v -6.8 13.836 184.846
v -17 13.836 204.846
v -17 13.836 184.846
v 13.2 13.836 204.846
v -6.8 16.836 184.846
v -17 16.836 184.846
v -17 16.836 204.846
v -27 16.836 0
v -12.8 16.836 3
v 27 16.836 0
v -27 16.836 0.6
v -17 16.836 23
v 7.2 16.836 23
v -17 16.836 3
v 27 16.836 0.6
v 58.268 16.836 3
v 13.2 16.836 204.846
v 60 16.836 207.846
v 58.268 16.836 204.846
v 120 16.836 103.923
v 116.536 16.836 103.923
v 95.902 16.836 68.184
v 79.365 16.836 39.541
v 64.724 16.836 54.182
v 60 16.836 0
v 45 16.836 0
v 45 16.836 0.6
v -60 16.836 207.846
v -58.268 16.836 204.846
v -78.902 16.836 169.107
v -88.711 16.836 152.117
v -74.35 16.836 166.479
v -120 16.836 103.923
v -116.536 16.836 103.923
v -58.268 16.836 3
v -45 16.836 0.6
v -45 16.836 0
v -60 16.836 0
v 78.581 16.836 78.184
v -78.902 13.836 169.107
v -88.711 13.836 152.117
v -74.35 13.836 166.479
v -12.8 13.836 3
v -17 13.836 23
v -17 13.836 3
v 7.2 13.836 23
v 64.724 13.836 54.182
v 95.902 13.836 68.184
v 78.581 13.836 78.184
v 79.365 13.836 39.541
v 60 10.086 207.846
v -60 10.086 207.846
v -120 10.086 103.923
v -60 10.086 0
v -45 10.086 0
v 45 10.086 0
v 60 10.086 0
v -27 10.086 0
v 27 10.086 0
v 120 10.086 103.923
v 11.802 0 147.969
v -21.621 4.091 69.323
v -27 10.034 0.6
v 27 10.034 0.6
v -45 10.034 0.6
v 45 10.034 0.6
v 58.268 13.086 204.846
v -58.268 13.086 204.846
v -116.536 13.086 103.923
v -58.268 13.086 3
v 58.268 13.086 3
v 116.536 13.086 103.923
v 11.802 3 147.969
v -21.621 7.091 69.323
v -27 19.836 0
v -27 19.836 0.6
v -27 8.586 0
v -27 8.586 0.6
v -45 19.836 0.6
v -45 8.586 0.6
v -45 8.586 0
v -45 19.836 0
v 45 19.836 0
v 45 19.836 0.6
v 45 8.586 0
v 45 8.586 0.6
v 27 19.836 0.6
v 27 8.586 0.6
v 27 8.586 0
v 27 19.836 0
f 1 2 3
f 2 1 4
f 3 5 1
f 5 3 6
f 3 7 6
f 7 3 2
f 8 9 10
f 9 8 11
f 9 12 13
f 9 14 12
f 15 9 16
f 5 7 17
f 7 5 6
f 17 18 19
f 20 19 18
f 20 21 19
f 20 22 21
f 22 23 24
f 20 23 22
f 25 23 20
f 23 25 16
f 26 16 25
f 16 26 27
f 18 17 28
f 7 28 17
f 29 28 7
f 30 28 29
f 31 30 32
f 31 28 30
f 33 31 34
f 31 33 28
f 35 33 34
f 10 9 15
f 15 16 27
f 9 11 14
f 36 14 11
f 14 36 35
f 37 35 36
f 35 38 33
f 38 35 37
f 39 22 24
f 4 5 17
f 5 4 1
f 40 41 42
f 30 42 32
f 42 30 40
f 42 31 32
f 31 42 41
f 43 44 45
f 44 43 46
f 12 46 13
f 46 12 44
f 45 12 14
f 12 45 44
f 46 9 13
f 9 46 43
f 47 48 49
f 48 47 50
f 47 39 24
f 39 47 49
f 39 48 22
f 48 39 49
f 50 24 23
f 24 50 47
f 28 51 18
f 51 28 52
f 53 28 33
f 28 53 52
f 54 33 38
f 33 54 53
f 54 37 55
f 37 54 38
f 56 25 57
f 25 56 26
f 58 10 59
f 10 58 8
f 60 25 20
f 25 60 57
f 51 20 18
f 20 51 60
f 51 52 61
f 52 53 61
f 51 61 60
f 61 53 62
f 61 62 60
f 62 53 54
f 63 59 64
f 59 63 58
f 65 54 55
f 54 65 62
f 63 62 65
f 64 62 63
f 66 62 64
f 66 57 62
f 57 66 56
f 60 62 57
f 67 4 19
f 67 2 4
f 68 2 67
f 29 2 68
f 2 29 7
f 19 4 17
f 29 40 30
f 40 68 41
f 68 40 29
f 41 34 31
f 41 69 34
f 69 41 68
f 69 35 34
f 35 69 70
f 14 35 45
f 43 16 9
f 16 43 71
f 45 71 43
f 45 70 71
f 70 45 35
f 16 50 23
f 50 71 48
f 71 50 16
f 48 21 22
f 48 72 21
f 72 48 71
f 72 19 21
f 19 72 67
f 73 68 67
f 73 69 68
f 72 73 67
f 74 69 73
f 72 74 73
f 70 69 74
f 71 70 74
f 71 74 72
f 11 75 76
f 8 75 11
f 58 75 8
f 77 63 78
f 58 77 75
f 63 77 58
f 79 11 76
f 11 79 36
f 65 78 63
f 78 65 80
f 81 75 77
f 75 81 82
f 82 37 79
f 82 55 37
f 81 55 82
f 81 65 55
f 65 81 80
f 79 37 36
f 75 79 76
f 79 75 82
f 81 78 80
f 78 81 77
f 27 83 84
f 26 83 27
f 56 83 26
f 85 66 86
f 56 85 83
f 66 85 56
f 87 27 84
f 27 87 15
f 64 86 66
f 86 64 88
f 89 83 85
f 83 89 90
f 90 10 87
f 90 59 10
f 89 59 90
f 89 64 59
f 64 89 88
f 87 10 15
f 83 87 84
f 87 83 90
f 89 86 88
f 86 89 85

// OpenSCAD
/*
    parametric_faceted_hex_wall_tile_mount_v30_supportless_chamfered_mounts.scad
    ----------------------------------------------------------------
    Regular asymmetric low-poly hex wall tile.

    v30 goals
    ---------
    1. Multi-object plate packing is the default design target.
    2. Preserve a TRUE regular hexagon -- no X/Y stretching.
    3. Default maximum corner-to-corner width = 240 mm / 9.449 in.
    4. Vertical export rests on a complete flat hex side, not a point.
    5. Open back remains fully open.
    6. Hidden mounting pads remain clipped below the visible face.
    7. One master thickness controls shell, perimeter, and pads.
    8. Integrated low-profile sacrificial stabilizer feet are enabled by default.
    9. Mounting pads use a 45-degree print-aware lower chamfer.
    10. Each elevated pad grows progressively from its perimeter-wall connection
        instead of creating a horizontal underside that triggers support warnings.
    11. No tall fins, diagonal scaffolds, or slicer-generated support are intended.
    12. The rear mounting surface remains flat; only the pad footprint is trimmed
        where required for supportless vertical printing.

    Recommended default
    -------------------
    face_size_reference      = "across_corners";
    face_size_units          = "mm";
    face_size                = 240.0;   // 9.449" maximum width

    tile_rotation_deg        = 15;

    export_orientation       = "vertical";
    vertical_edge_angle_deg  = 15;      // flat side on build plate

    master_thickness_mm      = 3.0;
    add_mount_pads           = true;
    add_mount_ribs           = false;

    // Multi-copy stability:
    add_vertical_breakaway_feet = true;
    vertical_foot_depth_mm       = 5.0;
    vertical_foot_height_mm      = 0.60;
    vertical_foot_neck_mm        = 0.80;

    Export
    ------
    F6 Render
    File -> Export -> Export as STL
*/


// =============================================================================
// CUSTOMIZER PARAMETERS
// =============================================================================


/* [Finished Face Size] */

// "bounding_square"
//     face_size is the maximum X and Y envelope.
//
// "flat_to_flat"
//     face_size is the traditional hex flat-to-flat dimension.
//
// "across_corners"
//     face_size is the regular-hex corner-to-corner dimension.
//
// v30 DEFAULT:
// across_corners = 240 mm so the vertically printed tile is about:
//     X = 240.0 mm
//     Z = 207.85 mm
// while resting on a complete flat edge.
face_size_reference = "across_corners"; // [bounding_square, flat_to_flat, across_corners]

// Units used by face_size.
face_size_units = "mm";                   // [mm, in]

// Default = 240 mm / 9.449 in maximum corner-to-corner width.
// This leaves useful X-axis margin on a 256 mm plate.
face_size = 240.0;

// Rotation of the finished hex within its face plane.
//
// IMPORTANT:
// 15 degrees gives a regular hex an equal X/Y bounding envelope.
// With bounding_square + 254 mm this produces approximately:
//     X = 254.0 mm
//     Y = 254.0 mm
tile_rotation_deg = 15;


/* [Export / Print Orientation] */

// "flat"     = conventional CAD orientation; decorative face points +Z.
// "vertical" = rotate final part onto an edge for vertical printing.
export_orientation = "vertical";          // [flat, vertical]

// Additional in-plane rotation used ONLY before standing the part vertically.
//
// IMPORTANT:
// The finished face uses tile_rotation_deg = 15 so its X/Y envelope is exactly
// square. A regular hex rests on a FLAT SIDE when its effective print-plane
// rotation is 30 degrees (modulo 60 degrees).
//
// Therefore the default vertical export adds another 15 degrees:
//
//     15 deg finished-face rotation
//   + 15 deg vertical export rotation
//   = 30 deg effective print rotation
//
// This puts a complete flat hex side on the build plate instead of a point.
// The transformed model is automatically translated so that side rests at Z=0.
// Rotate the finished 15-degree face orientation another 15 degrees before
// standing it up. 15 + 15 = 30 degrees, which places a complete hex side
// horizontally at the bottom rather than balancing the tile on a vertex.
vertical_edge_angle_deg = 15;

// Add small breakaway stabilizer feet after the model is stood vertically.
// Normally leave OFF and use a slicer brim if required.
add_vertical_breakaway_feet = true;

// Breakaway-foot dimensions.
vertical_foot_length_mm = 18.0;
vertical_foot_depth_mm = 5.0;
vertical_foot_height_mm = 0.60;
vertical_foot_neck_mm = 0.80;


/* [MASTER THICKNESS] */

// Main material thickness control.
master_thickness_mm = 3.0;

// Optional tuning multipliers.
front_shell_multiplier = 1.0;
perimeter_multiplier   = 1.0;
mount_pad_multiplier   = 1.0;


/* [Front Relief] */

// "proportional" scales relief with the true flat-to-flat dimension.
// "absolute" uses explicit millimeter values.
relief_height_mode = "proportional";      // [proportional, absolute]

relief_scale = 1.0;

// Relative relief proportions.
peak_height_ratio = 0.081;
ridge_to_peak_ratio = 0.757;
edge_to_peak_ratio = 0.097;

// Used only in absolute mode.
peak_height_mm   = 18.5;
ridge_height_mm = 14.0;
edge_height_mm  = 1.8;

// Minimum air gap between inner roof and mounting geometry.
edge_clearance_mm = 0.60;


/* [Facet Layout] */

peak_angle_deg = 45;
peak_radius_ratio = 0.38;

ridge_angle_deg = 208;
ridge_radius_ratio = 0.34;


/* [Wall Mounting] */

add_mount_pads = true;

// Width parallel to local hex edge.
mount_pad_width_mm = 34.0;

// Radial depth into the cavity.
mount_pad_depth_mm = 24.0;

// Structural overlap beneath the inner perimeter shell.
mount_pad_overlap_mm = 4.0;

// Pull mounting geometry inward from the visible outside perimeter.
 // Keep this smaller than the perimeter-wall thickness so the pad still
 // overlaps the wall by a positive amount.
// IMPORTANT:
 // Must be LESS than perimeter_wall_thickness_mm so the pads physically
 // overlap the perimeter wall and become one connected solid.
 mount_pad_edge_inset_mm = 0.5;

// Clearance below underside of visible face.
mount_face_clearance_mm = 0.75;

// Mount-pad directions in the tile's local coordinate system.
mount_pad_angles = [60, 120, 240, 300];


/* [Mount Reinforcement] */

add_mount_ribs = false;

mount_rib_width_mm  = 3.0;
mount_rib_height_mm = 5.0;
mount_rib_depth_mm  = 8.0;


/* [Optional Screw Holes] */

add_pad_screw_holes = false;

pad_screw_hole_diameter_mm = 4.5;



/* [Plate Packing Guidance] */

// These values do NOT duplicate objects inside the STL.
// They provide planning numbers in the OpenSCAD console for arranging
// multiple copies in the slicer.
//
// Typical X2D-style plate planning:
//   usable Y = 256 mm
//   keep a conservative front/rear margin
plate_depth_mm = 256.0;

plate_front_margin_mm = 8.0;
plate_rear_margin_mm  = 8.0;

// Recommended empty gap between adjacent standing tiles.
// Increase if using aggressive acceleration or if the printer has noticeable
// resonance/wobble on tall parts.
recommended_inter_tile_gap_mm = 8.0;

// Feet extend from Y=0 to vertical_foot_depth_mm.
// The actual tile relief occupies approximately peak_height in Y.
// Packing pitch uses whichever is deeper, plus the inter-tile gap.


/* [Vertical Self-Supporting Mount Pads] */

// Recommended ON for vertical printing.
//
// Each rectangular mounting-pad footprint is clipped by a 45-degree
// print-space half-space. The lower boundary starts at the pad's wall-connected
// outer corner and rises toward the unsupported portion of the pad.
//
// This avoids BOTH:
//   1. floating-island starts
//   2. flat horizontal pad undersides that cause slicer support warnings.
make_mount_pads_vertical_self_supporting = true;

// Small amount below the wall-connected start height that is retained.
// 0.20 mm is approximately one standard layer and guarantees overlap.
mount_pad_print_safety_mm = 0.20;

// Lower-face chamfer angle in FINAL PRINT coordinates.
//
// 45 degrees is the conservative default for supportless PLA printing.
// Larger values make a steeper/more vertical underside.
// Keep between 40 and 55 degrees unless deliberately experimenting.
mount_pad_support_angle_deg = 45.0;

// Large half-space size used only for clipping.
print_halfspace_size_mm = 1000.0;


/* [Vertical Anti-Float Gussets] */

// Some mounting pads begin above the build plate when the tile is printed
// vertically. Instead of a tall free-standing fin, v28 generates a short,
// diagonal sacrificial gusset from the already-printed perimeter wall toward
// the lowest corner of each affected pad.
//
// The gusset:
// - stays inside the rear cavity
// - is thin in Y for easy removal
// - grows from the shell toward the pad
// - is generated only for pads that would otherwise start as an island
add_vertical_antifloat_gussets = false;

// Thin sacrificial thickness into the cavity.
antifloat_gusset_thickness_mm = 0.70;

// How far the gusset extends into the pad for reliable layer connection.
antifloat_gusset_pad_overlap_mm = 1.50;

// Vertical distance below the first pad layer used for the shell-side anchor.
// A 30 mm drop keeps the diagonal print angle conservative while remaining
// dramatically shorter than the previous full-height support fins.
antifloat_gusset_drop_mm = 30.0;

// Height of the short attachment edge against the perimeter wall.
antifloat_gusset_wall_base_mm = 5.0;

// Keep the wall anchor slightly inside the visible outer perimeter.
antifloat_gusset_wall_inset_mm = 1.5;

// Ignore a pad if its lowest point is already essentially on the build plate.
antifloat_min_height_mm = 0.80;


/* [Advanced] */

polyhedron_convexity = 12;
screw_hole_fn = 40;

// Small numerical tolerance.
eps = 0.01;


// =============================================================================
// HELPERS
// =============================================================================

function polar(angle_deg, radius) =
    [
        radius * cos(angle_deg),
        radius * sin(angle_deg)
    ];

function hex_vertex_unrotated(i, radius) =
    [
        radius * cos(30 + i * 60),
        radius * sin(30 + i * 60)
    ];

function rotate2d(p, angle_deg) =
    [
        p[0] * cos(angle_deg) - p[1] * sin(angle_deg),
        p[0] * sin(angle_deg) + p[1] * cos(angle_deg)
    ];


// Position of a raw mount-pad corner after all in-plane rotations used by the
// vertical export. Returned as [final_X, final_Z] because after rotate X=90,
// original in-plane Y becomes print Z.
function mount_print_corner(angle_deg, radial_r, lateral_t) =
    let(
        theta =
            angle_deg
            + tile_rotation_deg
            + vertical_edge_angle_deg
    )
    [
        radial_r * cos(theta) - lateral_t * sin(theta),
        vertical_half_y
            + radial_r * sin(theta)
            + lateral_t * cos(theta)
    ];

function mount_print_corners(angle_deg) =
    [
        mount_print_corner(
            angle_deg,
            mount_pad_inner_r,
            -mount_pad_width_mm / 2
        ),
        mount_print_corner(
            angle_deg,
            mount_pad_inner_r,
             mount_pad_width_mm / 2
        ),
        mount_print_corner(
            angle_deg,
            mount_pad_desired_outer_r,
            -mount_pad_width_mm / 2
        ),
        mount_print_corner(
            angle_deg,
            mount_pad_desired_outer_r,
             mount_pad_width_mm / 2
        )
    ];

function mount_corner_z_values(angle_deg) =
    [
        for (p = mount_print_corners(angle_deg))
            p[1]
    ];

function mount_lowest_z(angle_deg) =
    min(mount_corner_z_values(angle_deg));

function mount_lowest_corner_index(angle_deg) =
    search(
        mount_lowest_z(angle_deg),
        mount_corner_z_values(angle_deg)
    )[0];

function mount_lowest_x(angle_deg) =
    mount_print_corners(angle_deg)[
        mount_lowest_corner_index(angle_deg)
    ][0];


function mount_outer_print_z_values(angle_deg) =
    [
        mount_print_corner(
            angle_deg,
            mount_pad_desired_outer_r,
            -mount_pad_width_mm / 2
        )[1],

        mount_print_corner(
            angle_deg,
            mount_pad_desired_outer_r,
             mount_pad_width_mm / 2
        )[1]
    ];

function mount_outer_lowest_z(angle_deg) =
    min(mount_outer_print_z_values(angle_deg));

function mount_outer_print_corners(angle_deg) =
    [
        mount_print_corner(
            angle_deg,
            mount_pad_desired_outer_r,
            -mount_pad_width_mm / 2
        ),

        mount_print_corner(
            angle_deg,
            mount_pad_desired_outer_r,
             mount_pad_width_mm / 2
        )
    ];

function mount_outer_lowest_corner_index(angle_deg) =
    search(
        mount_outer_lowest_z(angle_deg),
        mount_outer_print_z_values(angle_deg)
    )[0];

function mount_outer_lowest_x(angle_deg) =
    mount_outer_print_corners(angle_deg)[
        mount_outer_lowest_corner_index(angle_deg)
    ][0];

function mount_outer_lowest_lateral(angle_deg) =
    mount_outer_lowest_corner_index(angle_deg) == 0
        ? -mount_pad_width_mm / 2
        :  mount_pad_width_mm / 2;

function mount_matching_inner_x(angle_deg) =
    mount_print_corner(
        angle_deg,
        mount_pad_inner_r,
        mount_outer_lowest_lateral(angle_deg)
    )[0];

function mount_inward_x_sign(angle_deg) =
    mount_matching_inner_x(angle_deg) >= mount_outer_lowest_x(angle_deg)
        ? 1
        : -1;



// Half-width of the stood-up regular hex at a given print Z.
//
// In the default flat-side-down vertical orientation:
// - bottom/top edges are flat
// - maximum width is across corners
// - total print height is flat-to-flat
//
// This lets the sacrificial gusset anchor itself directly into the perimeter
// wall at the same side of the tile as the affected mounting pad.
function vertical_hex_half_width_at_z(z_mm) =
    let(
        zc = min(max(z_mm, 0), vertical_print_height),
        dz = min(zc, vertical_print_height - zc)
    )
    hex_side_length / 2 + dz / tan(60);

function hex_vertex(i, radius) =
    rotate2d(
        hex_vertex_unrotated(i, radius),
        tile_rotation_deg
    );

// Half-width / half-height of a unit-circumradius rotated regular hex.
function unit_hex_half_x(rotation_deg) =
    max([
        for (i = [0 : 5])
            abs(
                cos(30 + i * 60 + rotation_deg)
            )
    ]);

function unit_hex_half_y(rotation_deg) =
    max([
        for (i = [0 : 5])
            abs(
                sin(30 + i * 60 + rotation_deg)
            )
    ]);

// Bounding box of a regular hex with circumradius r.
function hex_bbox_x(r, rotation_deg) =
    2 * r * unit_hex_half_x(rotation_deg);

function hex_bbox_y(r, rotation_deg) =
    2 * r * unit_hex_half_y(rotation_deg);


// =============================================================================
// DERIVED MATERIAL THICKNESSES
// =============================================================================

front_shell_thickness_mm =
    master_thickness_mm * front_shell_multiplier;

perimeter_wall_thickness_mm =
    master_thickness_mm * perimeter_multiplier;

mount_pad_thickness_mm =
    master_thickness_mm * mount_pad_multiplier;


// =============================================================================
// DERIVED FACE DIMENSIONS
// =============================================================================

_face_size_mm =
    face_size_units == "in"
        ? face_size * 25.4
        : face_size;

// If bounding_square is selected, choose the largest regular-hex radius that
// fits inside both the requested X and Y dimensions.
//
// At tile_rotation_deg = 15, unit X and Y extents are equal, so both dimensions
// become exactly face_size.
r_outer =
    face_size_reference == "flat_to_flat"
        ? (_face_size_mm / 2) / cos(30)
        : face_size_reference == "across_corners"
            ? _face_size_mm / 2
            : min(
                _face_size_mm / (2 * unit_hex_half_x(tile_rotation_deg)),
                _face_size_mm / (2 * unit_hex_half_y(tile_rotation_deg))
              );

tile_flat_to_flat =
    2 * r_outer * cos(30);

tile_across_corners =
    2 * r_outer;

finished_bbox_x =
    hex_bbox_x(r_outer, tile_rotation_deg);

finished_bbox_y =
    hex_bbox_y(r_outer, tile_rotation_deg);

outer_apothem =
    tile_flat_to_flat / 2;

inner_apothem =
    outer_apothem - perimeter_wall_thickness_mm;

r_inner =
    inner_apothem / cos(30);

inner_flat_length =
    2 * inner_apothem * tan(30);

hex_side_length =
    r_outer;


// =============================================================================
// DERIVED RELIEF HEIGHTS
// =============================================================================

_peak_unscaled =
    relief_height_mode == "proportional"
        ? tile_flat_to_flat * peak_height_ratio
        : peak_height_mm;

_ridge_unscaled =
    relief_height_mode == "proportional"
        ? _peak_unscaled * ridge_to_peak_ratio
        : ridge_height_mm;

_requested_edge_unscaled =
    relief_height_mode == "proportional"
        ? _peak_unscaled * edge_to_peak_ratio
        : edge_height_mm;

peak_height =
    _peak_unscaled * relief_scale;

ridge_height =
    _ridge_unscaled * relief_scale;

requested_edge_height =
    _requested_edge_unscaled * relief_scale;

// Enough vertical room for front shell + complete pad + clearance.
minimum_edge_height =
    front_shell_thickness_mm
    + mount_pad_thickness_mm
    + mount_face_clearance_mm;

edge_height =
    max(
        requested_edge_height,
        minimum_edge_height
    );


// =============================================================================
// DERIVED MOUNTING GEOMETRY
// =============================================================================

mount_pad_desired_outer_r =
    inner_apothem + mount_pad_overlap_mm;

mount_pad_inner_r =
    mount_pad_desired_outer_r - mount_pad_depth_mm;

mount_pad_center_r =
    mount_pad_desired_outer_r - mount_pad_depth_mm / 2;

mount_clip_apothem =
    outer_apothem - mount_pad_edge_inset_mm;

mount_clip_radius =
    mount_clip_apothem / cos(30);


// =============================================================================
// VERTICAL-EXPORT DERIVED VALUES
// =============================================================================
//
// The tile is first rotated around Z by vertical_edge_angle_deg, then stood up
// by +90 degrees around X.
//
// We calculate the local Y envelope AFTER that optional Z rotation so the
// final model can be translated to put its lowest point exactly on Z=0.

vertical_rotation_total_deg =
    vertical_edge_angle_deg;

vertical_half_y =
    max([
        for (i = [0 : 5])
            abs(
                r_outer
                * sin(
                    30
                    + i * 60
                    + tile_rotation_deg
                    + vertical_rotation_total_deg
                )
            )
    ]);

vertical_print_height =
    2 * vertical_half_y;

// After rotate([90,0,0]), original +Z becomes -Y.
// Translate by peak_height so all relief lies in positive Y.
vertical_print_depth =
    peak_height;

// Multi-copy packing envelope in Y.
//
// vertical_tile() occupies approximately peak_height of Y-depth.
// Breakaway feet occupy vertical_foot_depth_mm.
// Use the larger dimension as the per-part physical depth.
vertical_object_depth =
    add_vertical_breakaway_feet
        ? vertical_print_depth + 3.0
        : vertical_print_depth;

recommended_copy_pitch_y =
    vertical_object_depth + recommended_inter_tile_gap_mm;

usable_plate_depth =
    plate_depth_mm
    - plate_front_margin_mm
    - plate_rear_margin_mm;

estimated_copies_per_plate_depth =
    max(
        1,
        floor(
            (
                usable_plate_depth
                + recommended_inter_tile_gap_mm
            )
            / recommended_copy_pitch_y
        )
    );


// =============================================================================
// VALIDATION
// =============================================================================

assert(
    _face_size_mm > 0,
    "face_size must produce a positive dimension."
);

assert(
    master_thickness_mm > 0,
    "master_thickness_mm must be greater than zero."
);

assert(
    front_shell_multiplier > 0
    && perimeter_multiplier > 0
    && mount_pad_multiplier > 0,
    "All thickness multipliers must be greater than zero."
);

assert(
    front_shell_thickness_mm > 0,
    "front_shell_thickness_mm must be greater than zero."
);

assert(
    perimeter_wall_thickness_mm > 0,
    "perimeter_wall_thickness_mm must be greater than zero."
);

assert(
    perimeter_wall_thickness_mm < outer_apothem,
    "perimeter_wall_thickness_mm is too large for this tile."
);

assert(
    inner_apothem > 0,
    "The selected perimeter wall leaves no hollow interior."
);

assert(
    edge_height > front_shell_thickness_mm,
    "Internal error: edge_height must exceed front_shell_thickness_mm."
);

assert(
    ridge_height > edge_height,
    "ridge_height must remain greater than the effective edge height."
);

assert(
    peak_height > ridge_height,
    "peak_height must remain greater than ridge_height."
);

assert(
    peak_radius_ratio > 0 && peak_radius_ratio < 0.90,
    "peak_radius_ratio must be between 0 and 0.90."
);

assert(
    ridge_radius_ratio > 0 && ridge_radius_ratio < 0.90,
    "ridge_radius_ratio must be between 0 and 0.90."
);

assert(
    mount_pad_width_mm > 0,
    "mount_pad_width_mm must be greater than zero."
);

assert(
    mount_pad_depth_mm > 0,
    "mount_pad_depth_mm must be greater than zero."
);

assert(
    mount_pad_thickness_mm > 0,
    "mount_pad_thickness_mm must be greater than zero."
);

assert(
    mount_pad_overlap_mm >= 0,
    "mount_pad_overlap_mm cannot be negative."
);

assert(
    mount_pad_edge_inset_mm >= 0,
    "mount_pad_edge_inset_mm cannot be negative."
);

assert(
    mount_pad_edge_inset_mm < perimeter_wall_thickness_mm,
    "mount_pad_edge_inset_mm must be smaller than perimeter_wall_thickness_mm so mounting pads overlap and join the perimeter wall."
);

assert(
    mount_face_clearance_mm >= 0,
    "mount_face_clearance_mm cannot be negative."
);

assert(
    mount_clip_apothem > 0,
    "mount_pad_edge_inset_mm is too large."
);

assert(
    mount_pad_inner_r > 0,
    "mount_pad_depth_mm is too large and reaches/passes the tile center."
);

assert(
    !add_pad_screw_holes
    || pad_screw_hole_diameter_mm < mount_pad_width_mm * 0.75,
    "pad_screw_hole_diameter_mm is too large for the mounting pad."
);

assert(
    !add_mount_ribs
    || mount_rib_height_mm > 0,
    "mount_rib_height_mm must be greater than zero."
);

assert(
    !add_vertical_breakaway_feet
    || export_orientation == "vertical",
    "Vertical breakaway feet require export_orientation = \"vertical\"."
);

assert(
    plate_depth_mm > 0,
    "plate_depth_mm must be greater than zero."
);

assert(
    plate_front_margin_mm >= 0
    && plate_rear_margin_mm >= 0,
    "Plate margins cannot be negative."
);

assert(
    recommended_inter_tile_gap_mm >= 0,
    "recommended_inter_tile_gap_mm cannot be negative."
);

assert(
    usable_plate_depth > 0,
    "Plate margins leave no usable plate depth."
);


assert(
    antifloat_gusset_thickness_mm > 0
    && antifloat_gusset_thickness_mm <= mount_pad_thickness_mm,
    "antifloat_gusset_thickness_mm must be > 0 and no thicker than the mounting pad."
);

assert(
    antifloat_gusset_pad_overlap_mm > 0,
    "antifloat_gusset_pad_overlap_mm must be greater than zero."
);

assert(
    antifloat_gusset_drop_mm > 0,
    "antifloat_gusset_drop_mm must be greater than zero."
);

assert(
    antifloat_gusset_wall_base_mm > 0,
    "antifloat_gusset_wall_base_mm must be greater than zero."
);

assert(
    antifloat_gusset_wall_inset_mm >= 0,
    "antifloat_gusset_wall_inset_mm cannot be negative."
);


assert(
    mount_pad_print_safety_mm >= 0,
    "mount_pad_print_safety_mm cannot be negative."
);

assert(
    mount_pad_support_angle_deg >= 40
    && mount_pad_support_angle_deg <= 55,
    "mount_pad_support_angle_deg should remain between 40 and 55 degrees."
);

assert(
    print_halfspace_size_mm > tile_across_corners * 2,
    "print_halfspace_size_mm is too small for the tile."
);


// =============================================================================
// DIAGNOSTIC OUTPUT
// =============================================================================

echo("====================================================");
echo("FACETED HEX WALL TILE v30 - SUPPORTLESS CHAMFERED MOUNTS");
echo("====================================================");

echo(str("face size reference      : ", face_size_reference));
echo(str("requested face size      : ", _face_size_mm, " mm"));
echo(str("tile rotation            : ", tile_rotation_deg, " deg"));

echo(str("finished bbox X          : ", finished_bbox_x, " mm"));
echo(str("finished bbox Y          : ", finished_bbox_y, " mm"));
echo(str("finished bbox X inches   : ", finished_bbox_x / 25.4, " in"));
echo(str("finished bbox Y inches   : ", finished_bbox_y / 25.4, " in"));

echo(str("flat-to-flat             : ", tile_flat_to_flat, " mm"));
echo(str("across-corners           : ", tile_across_corners, " mm"));
echo(str("hex side length          : ", hex_side_length, " mm"));

echo(str("MASTER thickness         : ", master_thickness_mm, " mm"));
echo(str("actual front shell       : ", front_shell_thickness_mm, " mm"));
echo(str("actual perimeter wall    : ", perimeter_wall_thickness_mm, " mm"));
echo(str("actual mount pad         : ", mount_pad_thickness_mm, " mm"));

echo(str("requested edge height    : ", requested_edge_height, " mm"));
echo(str("minimum edge height      : ", minimum_edge_height, " mm"));
echo(str("EFFECTIVE edge height    : ", edge_height, " mm"));

echo(str("ridge height             : ", ridge_height, " mm"));
echo(str("peak height              : ", peak_height, " mm"));
echo(str("peak height inches       : ", peak_height / 25.4, " in"));

echo(str("mount pad width          : ", mount_pad_width_mm, " mm"));
echo(str("mount pad depth          : ", mount_pad_depth_mm, " mm"));
echo(str("mount pad thickness      : ", mount_pad_thickness_mm, " mm"));
echo(str("mount pad overlap        : ", mount_pad_overlap_mm, " mm"));
echo(str("mount support angle      : ", mount_pad_support_angle_deg, " deg"));
echo(str("mount edge inset         : ", mount_pad_edge_inset_mm, " mm"));
echo(str("mount/face clearance     : ", mount_face_clearance_mm, " mm"));

echo(str("export orientation       : ", export_orientation));

if (
    export_orientation == "vertical"
    && add_mount_pads
    && add_vertical_antifloat_gussets
) {
    for (a = mount_pad_angles)
        echo(
            str(
                "mount pad ",
                a,
                " deg lowest print Z : ",
                mount_lowest_z(a),
                " mm"
            )
        );

        echo(
            str(
                "mount pad ",
                a,
                " deg wall-start Z   : ",
                mount_outer_lowest_z(a),
                " mm"
            )
        );
}

echo(str("vertical extra rotation  : ", vertical_edge_angle_deg, " deg"));
echo(str("effective print rotation : ",
         tile_rotation_deg + vertical_edge_angle_deg, " deg"));

if (export_orientation == "vertical"
    && abs(
        ((tile_rotation_deg + vertical_edge_angle_deg) % 60) - 30
    ) < 0.001)
    echo("build-plate contact      : FLAT HEX SIDE");
else if (export_orientation == "vertical")
    echo("build-plate contact      : WARNING - NOT EXACTLY FLAT-SIDE DOWN");

if (export_orientation == "vertical") {
    echo(str("vertical print height    : ", vertical_print_height, " mm"));
    echo(str("vertical relief depth    : ", vertical_print_depth, " mm"));
    echo(str("vertical object depth    : ", vertical_object_depth, " mm"));
    echo(str("recommended Y gap        : ", recommended_inter_tile_gap_mm, " mm"));
    echo(str("recommended Y pitch      : ", recommended_copy_pitch_y, " mm"));
    echo(str("usable plate Y depth     : ", usable_plate_depth, " mm"));
    echo(str("estimated copies in Y    : ", estimated_copies_per_plate_depth));
}

if (edge_height > requested_edge_height)
    echo(
        str(
            "AUTO EDGE FIX ACTIVE: edge raised from ",
            requested_edge_height,
            " mm to ",
            edge_height,
            " mm."
        )
    );

echo("====================================================");


// =============================================================================
// FRONT RELIEF CONTROL POINTS
// =============================================================================

P_xy =
    polar(
        peak_angle_deg + tile_rotation_deg,
        r_outer * peak_radius_ratio
    );

Q_xy =
    polar(
        ridge_angle_deg + tile_rotation_deg,
        r_outer * ridge_radius_ratio
    );


// =============================================================================
// SHELL VERTICES
// =============================================================================

points =
    concat(

        // 0..5 : outer rear perimeter
        [
            for (i = [0 : 5])
                let(p = hex_vertex(i, r_outer))
                [p[0], p[1], 0]
        ],

        // 6..11 : outer front perimeter
        [
            for (i = [0 : 5])
                let(p = hex_vertex(i, r_outer))
                [p[0], p[1], edge_height]
        ],

        // 12..13 : outer peak / ridge
        [
            [P_xy[0], P_xy[1], peak_height],
            [Q_xy[0], Q_xy[1], ridge_height]
        ],

        // 14..19 : inner rear perimeter
        [
            for (i = [0 : 5])
                let(p = hex_vertex(i, r_inner))
                [p[0], p[1], 0]
        ],

        // 20..25 : inner front perimeter
        [
            for (i = [0 : 5])
                let(p = hex_vertex(i, r_inner))
                [p[0], p[1], edge_height - front_shell_thickness_mm]
        ],

        // 26..27 : inner peak / ridge
        [
            [
                P_xy[0],
                P_xy[1],
                peak_height - front_shell_thickness_mm
            ],
            [
                Q_xy[0],
                Q_xy[1],
                ridge_height - front_shell_thickness_mm
            ]
        ]
    );


// =============================================================================
// SHELL FACES
// =============================================================================

outer_roof_faces = [
    [6, 7, 12],
    [7, 8, 12],
    [6, 12, 11],

    [8, 13, 12],
    [11, 12, 13],

    [8, 9, 13],
    [9, 10, 13],
    [10, 11, 13]
];

inner_roof_faces = [
    [26, 21, 20],
    [26, 22, 21],
    [25, 26, 20],

    [26, 27, 22],
    [27, 26, 25],

    [27, 23, 22],
    [27, 24, 23],
    [27, 25, 24]
];

faces =
    concat(

        // Outer vertical perimeter
        [
            for (i = [0 : 5])
                [
                    i,
                    (i + 1) % 6,
                    6 + (i + 1) % 6,
                    6 + i
                ]
        ],

        outer_roof_faces,

        // Inner vertical perimeter
        [
            for (i = [0 : 5])
                [
                    14 + i,
                    20 + i,
                    20 + (i + 1) % 6,
                    14 + (i + 1) % 6
                ]
        ],

        inner_roof_faces,

        // Narrow rear perimeter ring only.
        // Center remains fully open.
        [
            for (i = [0 : 5])
                [
                    i,
                    14 + i,
                    14 + (i + 1) % 6,
                    (i + 1) % 6
                ]
        ]
    );


// =============================================================================
// TILE SHELL
// =============================================================================

module tile_shell() {
    polyhedron(
        points = points,
        faces = faces,
        convexity = polyhedron_convexity
    );
}


// =============================================================================
// SAFE MOUNTING VOLUME BELOW FRONT FACE
// =============================================================================

safe_edge_z =
    max(
        eps,
        edge_height
        - front_shell_thickness_mm
        - mount_face_clearance_mm
    );

safe_peak_z =
    max(
        eps,
        peak_height
        - front_shell_thickness_mm
        - mount_face_clearance_mm
    );

safe_ridge_z =
    max(
        eps,
        ridge_height
        - front_shell_thickness_mm
        - mount_face_clearance_mm
    );

safe_mount_points =
    concat(

        // 0..5 : rear outer perimeter
        [
            for (i = [0 : 5])
                let(p = hex_vertex(i, r_outer))
                [p[0], p[1], 0]
        ],

        // 6..11 : safe ceiling at outer perimeter
        [
            for (i = [0 : 5])
                let(p = hex_vertex(i, r_outer))
                [p[0], p[1], safe_edge_z]
        ],

        // 12..13 : safe ceiling under peak/ridge
        [
            [P_xy[0], P_xy[1], safe_peak_z],
            [Q_xy[0], Q_xy[1], safe_ridge_z]
        ]
    );

safe_mount_ceiling_faces = [
    [6, 7, 12],
    [7, 8, 12],
    [6, 12, 11],
    [8, 13, 12],
    [11, 12, 13],
    [8, 9, 13],
    [9, 10, 13],
    [10, 11, 13]
];

safe_mount_faces =
    concat(

        // Outer side walls.
        [
            for (i = [0 : 5])
                [
                    i,
                    (i + 1) % 6,
                    6 + (i + 1) % 6,
                    6 + i
                ]
        ],

        // Sloped safe ceiling.
        safe_mount_ceiling_faces,

        // Rear floor used only to close clipping volume.
        [[5, 4, 3, 2, 1, 0]]
    );

module safe_mount_volume() {
    polyhedron(
        points = safe_mount_points,
        faces = safe_mount_faces,
        convexity = polyhedron_convexity
    );
}


// =============================================================================
// HEX FOOTPRINT FOR MOUNT CLIPPING
// =============================================================================

module mount_clip_volume(height_mm) {
    linear_extrude(height = height_mm)
        polygon(
            points = [
                for (i = [0 : 5])
                    hex_vertex(i, mount_clip_radius)
            ]
        );
}


// =============================================================================
// 45-DEGREE PRINT-SPACE HALF-SPACE FOR SELF-SUPPORTING MOUNT PADS
// =============================================================================
//
// v29 used a horizontal print-Z cutoff. That solved floating islands but
// created a flat underside, which Bambu Studio correctly identified as an
// overhang needing support.
//
// v30 instead keeps geometry ABOVE a sloped plane:
//
//     Z >= anchor_Z + slope * (X - anchor_X)
//
// where slope corresponds to mount_pad_support_angle_deg.
//
// The plane is defined in FINAL PRINT coordinates, then inverse-transformed
// back into the tile's native coordinate system for intersection with each pad.

module final_print_sloped_halfspace(
    anchor_x,
    anchor_z,
    inward_x_sign
) {

    H = print_halfspace_size_mm;

    slope =
        inward_x_sign
        * tan(mount_pad_support_angle_deg);

    z_left =
        anchor_z
        + slope * (-H - anchor_x);

    z_right =
        anchor_z
        + slope * ( H - anchor_x);

    top_z = H * 2;

    polyhedron(
        points = [
            [-H, -H, z_left],
            [ H, -H, z_right],
            [ H,  H, z_right],
            [-H,  H, z_left],

            [-H, -H, top_z],
            [ H, -H, top_z],
            [ H,  H, top_z],
            [-H,  H, top_z]
        ],

        faces = [
            [0, 3, 2, 1],
            [4, 5, 6, 7],

            [0, 1, 5, 4],
            [1, 2, 6, 5],
            [2, 3, 7, 6],
            [3, 0, 4, 7]
        ],

        convexity = 8
    );
}


module supportless_mount_clip(angle_deg) {

    anchor_x =
        mount_outer_lowest_x(angle_deg);

    anchor_z =
        mount_outer_lowest_z(angle_deg)
        - mount_pad_print_safety_mm;

    inward_sign =
        mount_inward_x_sign(angle_deg);

    // Inverse of the vertical-export transform:
    //
    // forward =
    //   translate([0, peak_height, vertical_half_y])
    //   rotate([90,0,0])
    //   rotate([0,0,vertical_edge_angle_deg])
    //
    // inverse =
    //   rotate Z(-phi)
    //   rotate X(-90)
    //   translate(-T)

    rotate([0, 0, -vertical_edge_angle_deg])

        rotate([-90, 0, 0])

            translate(
                [
                    0,
                    -peak_height,
                    -vertical_half_y
                ]
            )

                final_print_sloped_halfspace(
                    anchor_x,
                    anchor_z,
                    inward_sign
                );
}


// =============================================================================
// RAW MOUNT PAD
// =============================================================================
//
// Mount-pad angles are local tile angles. tile_rotation_deg is applied so the
// pads remain attached to the same visual positions when the face rotates.

module raw_mount_pad(angle_deg) {
    rotate([0, 0, angle_deg + tile_rotation_deg])
        translate(
            [
                mount_pad_inner_r,
                -mount_pad_width_mm / 2,
                0
            ]
        )
            cube(
                [
                    mount_pad_depth_mm,
                    mount_pad_width_mm,
                    mount_pad_thickness_mm
                ]
            );
}


// =============================================================================
// CLIPPED MOUNT PAD
// =============================================================================

module mount_pad(angle_deg) {

    intersection() {

        raw_mount_pad(angle_deg);

        // Keep pad inside inset hex footprint while still penetrating the
        // perimeter wall enough to form a robust union.
        mount_clip_volume(
            mount_pad_thickness_mm + eps
        );

        // Hard stop below underside of front shell.
        safe_mount_volume();

        // Vertical-print island + overhang prevention.
        //
        // The sloped clip starts at the wall-connected lower corner and rises
        // inward at mount_pad_support_angle_deg. This prevents both an isolated
        // pad start and a horizontal underside that would require support.
        if (
            export_orientation == "vertical"
            && make_mount_pads_vertical_self_supporting
        )
            supportless_mount_clip(angle_deg);
    }
}


// =============================================================================
// OPTIONAL REINFORCING RIBS
// =============================================================================

module raw_mount_ribs(angle_deg) {

    rib_center_r =
        mount_pad_desired_outer_r
        - mount_rib_depth_mm / 2;

    rib_side_offset =
        max(
            0,
            mount_pad_width_mm / 2
            - mount_rib_width_mm
            - 2
        );

    rotate([0, 0, angle_deg + tile_rotation_deg]) {

        for (side = [-1, 1]) {

            translate(
                [
                    rib_center_r - mount_rib_depth_mm / 2,
                    side * rib_side_offset - mount_rib_width_mm / 2,
                    mount_pad_thickness_mm
                ]
            )

            rotate([90, 0, 90])

            linear_extrude(height = mount_rib_depth_mm)

            polygon(
                points = [
                    [0, 0],
                    [mount_rib_width_mm, 0],
                    [mount_rib_width_mm, mount_rib_height_mm],
                    [0, 0]
                ]
            );
        }
    }
}

module mount_ribs(angle_deg) {
    intersection() {

        raw_mount_ribs(angle_deg);

        mount_clip_volume(
            mount_pad_thickness_mm
            + mount_rib_height_mm
            + 0.1
        );

        safe_mount_volume();
    }
}


// =============================================================================
// OPTIONAL SCREW HOLE
// =============================================================================

module pad_screw_hole(angle_deg) {

    rotate([0, 0, angle_deg + tile_rotation_deg])

        translate(
            [
                mount_pad_center_r,
                0,
                -1
            ]
        )

            cylinder(
                d = pad_screw_hole_diameter_mm,
                h =
                    mount_pad_thickness_mm
                    + mount_rib_height_mm
                    + 2,
                $fn = screw_hole_fn
            );
}


// =============================================================================
// COMPLETE FINISHED TILE
// =============================================================================

module finished_tile() {

    difference() {

        union() {

            tile_shell();

            if (add_mount_pads) {

                for (a = mount_pad_angles) {

                    mount_pad(a);

                    if (add_mount_ribs)
                        mount_ribs(a);
                }
            }
        }

        if (
            add_mount_pads
            && add_pad_screw_holes
        ) {

            for (a = mount_pad_angles)
                pad_screw_hole(a);
        }
    }
}


// =============================================================================
// VERTICAL-PRINT TRANSFORM
// =============================================================================
//
// Transform order in OpenSCAD is inside-out:
//
// 1. finished_tile()
// 2. optional extra Z rotation for selecting another edge
// 3. rotate +90 degrees around X so the face stands vertically
// 4. translate so:
//      - relief depth occupies positive Y
//      - lowest tile point is exactly at Z=0

module vertical_tile() {

    translate(
        [
            0,
            peak_height,
            vertical_half_y
        ]
    )

    rotate([90, 0, 0])

    rotate([0, 0, vertical_edge_angle_deg])

        finished_tile();
}


// =============================================================================
// OPTIONAL BREAKAWAY VERTICAL FEET
// =============================================================================
//
// These are intentionally simple sacrificial tabs.
// They are added only in vertical export mode.
// Leave OFF unless a brim alone is not sufficient.

module vertical_breakaway_feet() {

    /*
        CONNECTED stabilizer feet.

        For flat-side-down vertical export, the bottom perimeter wall occupies
        approximately:

            Y = peak_height - edge_height  ...  peak_height

        and the bottom flat side spans roughly one hex-side length in X.

        The v25 feet were placed near Y=0 and too far outward in X, so they
        could become disconnected solids. v26 deliberately overlaps the
        actual bottom perimeter wall in both X and Y.

        The tabs extend only a few millimeters beyond the rear face, keeping
        Y-depth compact for multi-copy plate packing.
    */

    foot_center_x =
        hex_side_length * 0.30;

    // Safely inside the actual bottom flat-edge span.
    foot_length_x =
        min(
            vertical_foot_length_mm,
            hex_side_length * 0.25
        );

    // Bottom perimeter wall depth after the vertical transform.
    bottom_wall_y_min =
        peak_height - edge_height;

    bottom_wall_y_max =
        peak_height;

    // Extend a little toward the decorative face and a little behind the tile.
    foot_y_min =
        max(
            0,
            bottom_wall_y_min - 1.5
        );

    foot_y_max =
        bottom_wall_y_max + 3.0;

    attached_foot_depth =
        foot_y_max - foot_y_min;

    for (x = [-foot_center_x, foot_center_x]) {

        // Main shallow sacrificial pad.
        //
        // It overlaps the lower perimeter wall in volume, so CGAL produces
        // one connected body instead of merely touching at a plane.
        translate(
            [
                x - foot_length_x / 2,
                foot_y_min,
                0
            ]
        )
            cube(
                [
                    foot_length_x,
                    attached_foot_depth,
                    vertical_foot_height_mm
                ]
            );

        // Small reinforcing neck rising into the bottom perimeter wall.
        translate(
            [
                x - vertical_foot_neck_mm / 2,
                bottom_wall_y_min,
                0
            ]
        )
            cube(
                [
                    vertical_foot_neck_mm,
                    edge_height,
                    min(3.0, perimeter_wall_thickness_mm)
                ]
            );
    }
}



// =============================================================================
// AUTOMATIC VERTICAL ANTI-FLOAT GUSSETS
// =============================================================================
//
// These are sacrificial PRINTING AIDS.
//
// Each elevated mounting pad gets a thin triangular prism whose:
//   - upper tip overlaps the lowest pad corner
//   - lower/base edge overlaps the already-existing perimeter wall
//   - thickness lies only on the cavity side
//
// Because the support grows diagonally out of the shell, it avoids the long,
// free-standing vertical strips used in v27.
//
// The triangle is constructed directly in final print X/Z coordinates, then
// extruded a small amount in Y.

module xz_triangle_prism(p0, p1, p2, y0, thickness_y) {

    y1 = y0 + thickness_y;

    polyhedron(
        points = [
            [p0[0], y0, p0[1]],
            [p1[0], y0, p1[1]],
            [p2[0], y0, p2[1]],

            [p0[0], y1, p0[1]],
            [p1[0], y1, p1[1]],
            [p2[0], y1, p2[1]]
        ],

        faces = [
            [0, 2, 1],
            [3, 4, 5],

            [0, 1, 4, 3],
            [1, 2, 5, 4],
            [2, 0, 3, 5]
        ],

        convexity = 8
    );
}


module vertical_antifloat_gusset(angle_deg) {

    lowest_z = mount_lowest_z(angle_deg);
    lowest_x = mount_lowest_x(angle_deg);

    if (lowest_z > antifloat_min_height_mm) {

        // Choose a shell anchor below the first pad layer.
        anchor_z =
            max(
                0.40,
                lowest_z - antifloat_gusset_drop_mm
            );

        // Which side of the tile is the pad on?
        side_sign =
            lowest_x < 0 ? -1 : 1;

        // Anchor into the actual perimeter wall rather than floating in space.
        anchor_half_width =
            vertical_hex_half_width_at_z(anchor_z);

        anchor_x =
            side_sign
            * max(
                0,
                anchor_half_width
                - antifloat_gusset_wall_inset_mm
            );

        // Short vertical attachment edge against the perimeter wall.
        wall_base_z0 =
            max(
                0.20,
                anchor_z - antifloat_gusset_wall_base_mm / 2
            );

        wall_base_z1 =
            min(
                vertical_print_height - 0.20,
                anchor_z + antifloat_gusset_wall_base_mm / 2
            );

        // Move the gusset tip slightly into the pad, ensuring a true overlap
        // rather than a zero-thickness/tangent contact.
        tip_x =
            lowest_x
            - side_sign * antifloat_gusset_pad_overlap_mm;

        tip_z =
            lowest_z
            + antifloat_gusset_pad_overlap_mm;

        // Cavity-side Y position.
        //
        // The rear mounting pads occupy approximately:
        //   Y = peak_height - mount_pad_thickness_mm ... peak_height
        //
        // Put the gusset against the cavity-facing side of that pad.
        gusset_y =
            peak_height
            - mount_pad_thickness_mm;

        xz_triangle_prism(
            [anchor_x, wall_base_z0],
            [anchor_x, wall_base_z1],
            [tip_x, tip_z],
            gusset_y,
            antifloat_gusset_thickness_mm
        );
    }
}


module vertical_antifloat_gussets() {

    if (
        export_orientation == "vertical"
        && add_mount_pads
        && add_vertical_antifloat_gussets
    ) {
        for (a = mount_pad_angles)
            vertical_antifloat_gusset(a);
    }
}


// =============================================================================
// OUTPUT
// =============================================================================
//
// Default v30 exported STL target:
//   X ~ 240.00 mm  / 9.449 in
//   Y ~ relief depth (~17-19 mm depending on relief settings)
//   Z ~ 207.85 mm  / 8.183 in
//
// Multiple copies should be duplicated and arrayed along Y in the slicer.

module output_model() {

    if (export_orientation == "vertical") {

        union() {

            vertical_tile();

            if (add_vertical_breakaway_feet)
                vertical_breakaway_feet();

            vertical_antifloat_gussets();
        }

    } else {

        finished_tile();
    }
}

output_model();
